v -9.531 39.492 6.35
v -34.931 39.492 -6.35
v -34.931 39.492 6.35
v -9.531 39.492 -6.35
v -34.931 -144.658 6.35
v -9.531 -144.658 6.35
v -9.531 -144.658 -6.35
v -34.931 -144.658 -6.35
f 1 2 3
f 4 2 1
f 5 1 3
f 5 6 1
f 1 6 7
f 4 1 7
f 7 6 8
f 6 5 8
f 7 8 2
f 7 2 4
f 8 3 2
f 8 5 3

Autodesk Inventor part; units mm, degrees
ref_plane "YZ Plane" through (0, 0, 0) normal (1, 0, 0) x (0, 1, 0)
ref_plane "XZ Plane" through (0, 0, 0) normal (0, 1, 0) x (-1, 0, 0)
ref_plane "XY Plane" through (0, 0, 0) normal (0, 0, 1) x (1, 0, 0)
sketch "Sketch1" plane through (0, 0, 0) normal (0, 0, 1) x (1, 0, 0)
  line L0 (-22.2313, 26.7915) -> (109.8487, 26.7915)
  line L1 (109.8487, 26.7915) -> (109.8487, -144.6585)
  line L2 (109.8487, -144.6585) -> (-22.2313, -144.6585)
  line L3 (-22.2313, -144.6585) -> (-22.2313, 26.7915)
  line L4 (-22.2313, 26.7915) -> (-28.5813, 26.7915)
  line L5 (-28.5813, 26.7915) -> (-28.5813, 39.4915)
  line L6 (-28.5813, 39.4915) -> (116.1987, 39.4915)
  line L7 (116.1987, 39.4915) -> (116.1987, 26.7915)
  line L8 (116.1987, 26.7915) -> (128.8987, 26.7915)
  line L9 (128.8987, 26.7915) -> (128.8987, 14.0915)
  line L10 (128.8987, 14.0915) -> (116.1987, 14.0915)
  line L11 (116.1987, 14.0915) -> (116.1987, -131.9585)
  line L12 (116.1987, -131.9585) -> (128.8987, -131.9585)
  line L13 (128.8987, -131.9585) -> (128.8987, -144.6585)
  line L14 (128.8987, -144.6585) -> (116.1987, -144.6585)
  line L15 (116.1987, -144.6585) -> (116.1987, -154.1835)
  line L16 (116.1987, -154.1835) -> (-28.5813, -154.1835)
  line L17 (-28.5813, -154.1835) -> (-28.5813, -144.6585)
  line L18 (-28.5813, -144.6585) -> (-41.2813, -144.6585)
  line L19 (-41.2813, -144.6585) -> (-41.2813, -131.9585)
  line L20 (-41.2813, -131.9585) -> (-28.5813, -131.9585)
  line L21 (-28.5813, -131.9585) -> (-28.5813, 14.0915)
  line L22 (-28.5813, 14.0915) -> (-41.2813, 14.0915)
  line L23 (-41.2813, 14.0915) -> (-41.2813, 26.7915)
  line L24 (-41.2813, 26.7915) -> (-28.5813, 26.7915)
  line L25 (-22.2313, -144.6585) -> (-22.2313, -151.0085)
  line L26 (-22.2313, -151.0085) -> (15.8687, -151.0085)
  line L27 (15.8687, -151.0085) -> (15.8687, -144.6585)
  line L28 (15.8687, -144.6585) -> (22.2187, -144.6585)
  line L29 (22.2187, -144.6585) -> (22.2187, -151.0085)
  line L30 (109.8487, -144.6585) -> (109.8487, -151.0085)
  line L31 (109.8487, -151.0085) -> (71.7487, -151.0085)
  line L32 (71.7487, -151.0085) -> (71.7487, -144.6585)
  line L33 (71.7487, -144.6585) -> (65.3987, -144.6585)
  line L34 (65.3987, -144.6585) -> (65.3987, -151.0085)
  line L35 (65.3987, -151.0085) -> (22.2187, -151.0085)
  line L36 (-22.2313, 26.7915) -> (-22.2313, 33.1415)
  line L37 (-22.2313, 33.1415) -> (15.8687, 33.1415)
  line L38 (15.8687, 33.1415) -> (15.8687, 26.7915)
  line L39 (22.2187, 26.7915) -> (22.2187, 33.1415)
  line L40 (22.2187, 33.1415) -> (65.3987, 33.1415)
  line L41 (65.3987, 33.1415) -> (65.3987, 26.7915)
  line L42 (71.7487, 26.7915) -> (71.7487, 33.1415)
  line L43 (71.7487, 33.1415) -> (109.8487, 33.1415)
  line L44 (109.8487, 33.1415) -> (109.8487, 26.7915)
  circle A0 centre (-34.9313, 20.4415) radius 1.9812
  circle A1 centre (122.5487, 20.4415) radius 1.9812
  circle A2 centre (122.5487, -138.3085) radius 1.9812
  circle A3 centre (-34.9313, -138.3085) radius 1.9812
  point P0 (0, 0)
  dimension "d0" = 132.08
  dimension "d1" = 171.45
  dimension "d2" = 6.35
  dimension "d3" = 12.7
  dimension "d4" = 144.78
  dimension "d5" = 12.7
  dimension "d6" = 12.7
  dimension "d7" = 146.05
  dimension "d8" = 9.525
  dimension "d9" = 12.7
  dimension "d10" = 6.35
  dimension "d11" = 38.1
  dimension "d12" = 6.35
  dimension "d13" = 38.1
  dimension "d14" = 6.35
  dimension "d15" = 3.9624
  dimension "d16" = 3.9624
extrude "Extrusion1" add sketch "Sketch1" along normal blind 6.35
sketch "Sketch2" plane through (-28.5813, -154.1835, 0) normal (0, -1, 0) x (1, 0, 0)
  line L0 (144.78, 6.35) -> (0, 6.35) projected
  line L1 (0, 0) -> (0, 6.35) projected
  line L2 (0, 0) -> (144.78, 0) projected
  line L3 (144.78, 0) -> (144.78, 6.35) projected
  point P0 (28.5813, 0)
extrude "Extrusion2" add sketch "Sketch2" along normal blind 3.175
sketch "Sketch3" plane through (0, 0, 6.35) normal (0, 0, 1) x (1, 0, 0)
  line L0 (-28.5813, 14.0915) -> (-41.2813, 14.0915) projected
  line L1 (-28.5813, -131.9585) -> (-28.5813, 14.0915) projected
  line L2 (-41.2813, -131.9585) -> (-28.5813, -131.9585) projected
  line L3 (116.1987, -131.9585) -> (128.8987, -131.9585) projected
  line L4 (116.1987, 14.0915) -> (116.1987, -131.9585) projected
  line L5 (128.8987, 14.0915) -> (116.1987, 14.0915) projected
  line L6 (71.7487, 33.1415) -> (109.8487, 33.1415) projected
  line L7 (-41.2813, 14.0915) -> (-41.2813, -131.9585)
  line L8 (128.8987, 14.0915) -> (128.8987, -131.9585)
  point P0 (0, 0)
extrude "Extrusion3" add sketch "Sketch3" against normal blind 6.35
sketch "Sketch4" plane through (0, 0, 6.35) normal (0, 0, 1) x (1, 0, 0)
  line L0 (-28.5813, -157.3585) -> (-28.5813, -144.6585) projected
  line L1 (-28.5813, -157.3585) -> (116.1987, -157.3585) projected
  line L2 (116.1987, -144.6585) -> (116.1987, -157.3585) projected
  line L3 (109.8487, 33.1415) -> (109.8487, -151.0085) projected
  line L4 (-22.2313, -151.0085) -> (-22.2313, 33.1415) projected
  line L5 (15.8687, 26.7915) -> (22.2187, 26.7915) projected
  line L6 (71.7487, 33.1415) -> (109.8487, 33.1415) projected
  line L7 (15.8687, 26.7915) -> (-22.2313, 26.7915)
  line L8 (22.2187, 26.7915) -> (109.8487, 26.7915)
  line L9 (109.8487, 26.7915) -> (109.8487, 20.4415)
  line L10 (109.8487, 20.4415) -> (-22.2313, 20.4415)
  line L11 (-22.2313, 20.4415) -> (-22.2313, 26.7915)
  line L12 (-22.2313, -144.6585) -> (-22.2313, -138.3085)
  line L13 (-22.2313, -138.3085) -> (109.8487, -138.3085)
  line L14 (109.8487, -144.6585) -> (-22.2313, -144.6585)
  line L15 (-28.5813, -151.0085) -> (-41.2813, -151.0085)
  line L16 (-41.2813, -151.0085) -> (-41.2813, -157.3585)
  line L17 (-41.2813, -157.3585) -> (-28.5813, -157.3585)
  line L18 (116.1987, -151.0085) -> (128.8987, -151.0085)
  line L19 (128.8987, -151.0085) -> (128.8987, -157.3585)
  line L20 (128.8987, -157.3585) -> (116.1987, -157.3585)
  point P0 (0, 0)
extrude "Extrusion4" add sketch "Sketch4" against normal blind 6.35 contours L17 L16 L15 L0 | L2 L18 L19 L20 | L3 L10 L4 L7 L5 L8 | L3 L14 L4 L13
sketch "Sketch5" plane through (0, 0, 6.35) normal (0, 0, 1) x (1, 0, 0)
  line L0 (-28.5813, 26.7915) -> (-28.5813, 39.4915) projected
  line L1 (116.1987, 39.4915) -> (116.1987, 26.7915) projected
  line L2 (15.8687, 33.1415) -> (15.8687, 26.7915) projected
  line L3 (-28.5813, 39.4915) -> (-41.2813, 39.4915)
  line L4 (-41.2813, 39.4915) -> (-41.2813, 33.1415)
  line L5 (-41.2813, 33.1415) -> (-28.5813, 33.1415)
  line L6 (116.1987, 39.4915) -> (128.8987, 39.4915)
  line L7 (128.8987, 39.4915) -> (128.8987, 33.1415)
  line L8 (128.8987, 33.1415) -> (116.1987, 33.1415)
  point P0 (0, 0)
extrude "Extrusion5" add sketch "Sketch5" against normal blind 6.35
sketch "Sketch6" plane through (0, 0, 6.35) normal (0, 0, 1) x (1, 0, 0)
  line L0 (65.3987, -151.0085) -> (22.2187, -151.0085) projected
  line L1 (22.2187, -144.6585) -> (65.3987, -144.6585) projected
  line L2 (-22.2313, -144.6585) -> (15.8687, -144.6585) projected
  line L3 (109.8487, -151.0085) -> (71.7487, -151.0085) projected
  line L4 (65.3987, 26.7915) -> (22.2187, 26.7915) projected
  line L5 (109.8487, 26.7915) -> (71.7487, 26.7915) projected
  line L6 (-41.2813, 26.7915) -> (-28.5813, 26.7915) projected
  line L7 (-28.5813, -151.0085) -> (-41.2813, -151.0085) projected
  line L8 (128.8987, -151.0085) -> (116.1987, -151.0085) projected
  line L9 (116.1987, 26.7915) -> (128.8987, 26.7915) projected
  line L10 (-28.5813, 33.1415) -> (-34.9313, 33.1415)
  line L11 (-34.9313, 33.1415) -> (-34.9313, 26.7915)
  line L12 (-34.9313, 26.7915) -> (-28.5813, 26.7915)
  line L13 (-28.5813, 26.7915) -> (-28.5813, 33.1415)
  line L14 (15.8687, 33.1415) -> (10.0792, 33.1415)
  line L15 (10.0792, 33.1415) -> (10.0792, 26.7915)
  line L16 (10.0792, 26.7915) -> (15.8687, 26.7915)
  line L17 (15.8687, 26.7915) -> (15.8687, 33.1415)
  line L18 (22.2187, 33.1415) -> (28.5687, 33.1415)
  line L19 (28.5687, 33.1415) -> (28.5687, 26.7915)
  line L20 (28.5687, 26.7915) -> (22.2187, 26.7915)
  line L21 (22.2187, 26.7915) -> (22.2187, 33.1415)
  line L22 (65.3987, 33.1415) -> (59.0487, 33.1415)
  line L23 (59.0487, 33.1415) -> (59.0487, 26.7915)
  line L24 (59.0487, 26.7915) -> (65.3987, 26.7915)
  line L25 (65.3987, 26.7915) -> (65.3987, 33.1415)
  line L26 (71.7487, 33.1415) -> (78.0987, 33.1415)
  line L27 (78.0987, 33.1415) -> (78.0987, 26.7915)
  line L28 (78.0987, 26.7915) -> (71.7487, 26.7915)
  line L29 (71.7487, 26.7915) -> (71.7487, 33.1415)
  line L30 (116.1987, 33.1415) -> (122.5487, 33.1415)
  line L31 (122.5487, 33.1415) -> (122.5487, 26.7915)
  line L32 (122.5487, 26.7915) -> (116.1987, 26.7915)
  line L33 (116.1987, 26.7915) -> (116.1987, 33.1415)
  line L34 (-28.5813, -144.6585) -> (-34.9313, -144.6585)
  line L35 (-34.9313, -144.6585) -> (-34.9313, -151.0085)
  line L36 (-34.9313, -151.0085) -> (-28.5813, -151.0085)
  line L37 (-28.5813, -151.0085) -> (-28.5813, -144.6585)
  line L38 (10.0792, -144.6585) -> (28.5687, -144.6585)
  line L39 (28.5687, -144.6585) -> (28.5687, -151.0085)
  line L40 (28.5687, -151.0085) -> (10.0792, -151.0085)
  line L41 (10.0792, -151.0085) -> (10.0792, -144.6585)
  line L42 (59.0487, -144.6585) -> (78.0987, -144.6585)
  line L43 (78.0987, -144.6585) -> (78.0987, -151.0085)
  line L44 (78.0987, -151.0085) -> (59.0487, -151.0085)
  line L45 (59.0487, -151.0085) -> (59.0487, -144.6585)
  line L46 (116.1987, -144.6585) -> (122.5487, -144.6585)
  line L47 (122.5487, -144.6585) -> (122.5487, -151.0085)
  line L48 (122.5487, -151.0085) -> (116.1987, -151.0085)
  line L49 (116.1987, -151.0085) -> (116.1987, -144.6585)
  point P0 (0, 0)
  dimension "d27" = 6.35
  dimension "d28" = 6.35
  dimension "d29" = 6.35
  dimension "d30" = 6.35
  dimension "d31" = 6.35
extrude "Extrusion6" add sketch "Sketch6" against normal blind 6.35 contours L0 L45 L1 L42 L43 L3 L44 | L0 L40 L41 L2 L38 L1 L39 | L4 L21 L18 L19 | L4 L23 L22 L25 | L5 L29 L26 L27 | L11 L10 L13 L6 | L7 L35 L34 L37 | L8 L49 L46 L47 | L33 L30 L31 L9 | L17 L16 L15 L14
sketch "Sketch7" plane through (0, 0, 0) normal (0, 0, -1) x (-1, 0, 0)
  line L0 (-128.8987, 39.4915) -> (-90.7987, 39.4915)
  line L1 (-90.7987, 39.4915) -> (-90.7987, 115.6915)
  line L2 (-90.7987, 115.6915) -> (-128.8987, 115.6915)
  line L3 (-128.8987, 115.6915) -> (-128.8987, 39.4915)
  line L4 (-90.7987, 39.4915) -> (41.2813, 39.4915)
  line L5 (41.2813, 39.4915) -> (41.2813, 64.8915)
  line L6 (41.2813, 64.8915) -> (-90.7987, 64.8915)
  line L7 (-90.7987, 64.8915) -> (-90.7987, 39.4915)
  point P0 (0, 0)
  dimension "d34" = 38.1
  dimension "d35" = 76.2
  dimension "d36" = 25.4
extrude "Extrusion7" add sketch "Sketch7" against normal blind 6.35
sketch "Sketch8" plane through (0, 0, 0) normal (0, 0, -1) x (-1, 0, 0)
  line L0 (41.2813, 64.8915) -> (210.1913, 64.8915)
  line L1 (210.1913, 64.8915) -> (210.1913, 39.4915)
  line L2 (210.1913, 39.4915) -> (41.2813, 39.4915)
  line L3 (41.2813, 39.4915) -> (41.2813, 64.8915)
  line L4 (210.1913, 64.8915) -> (172.0913, 64.8915)
  line L5 (172.0913, 64.8915) -> (172.0913, 115.6915)
  line L6 (172.0913, 115.6915) -> (210.1913, 115.6915)
  line L7 (210.1913, 115.6915) -> (210.1913, 64.8915)
  point P0 (0, 0)
  dimension "d39" = 168.91
  dimension "d40" = 25.4
  dimension "d41" = 38.1
extrude "Extrusion8" add sketch "Sketch8" against normal blind 6.35
sketch "Sketch9" plane through (0, 0, 0) normal (0, 0, -1) x (-1, 0, 0)
  line L0 (-109.8487, 26.7915) -> (-109.8487, 33.1415) projected
  line L1 (-109.8487, 33.1415) -> (-78.0987, 33.1415) projected
  line L2 (-78.0987, 26.7915) -> (-78.0987, 33.1415) projected
  line L3 (-109.8487, 26.7915) -> (-78.0987, 26.7915) projected
  line L4 (-10.0792, 33.1415) -> (-10.0792, 26.7915) projected
  line L5 (-10.0792, 33.1415) -> (22.2313, 33.1415) projected
  line L6 (22.2313, 33.1415) -> (22.2313, 26.7915) projected
  line L7 (-10.0792, 26.7915) -> (22.2313, 26.7915) projected
  line L8 (-59.0487, 33.1415) -> (-28.5687, 33.1415) projected
  line L9 (-28.5687, 26.7915) -> (-28.5687, 33.1415) projected
  line L10 (-59.0487, 26.7915) -> (-28.5687, 26.7915) projected
  line L11 (-59.0487, 33.1415) -> (-59.0487, 26.7915) projected
  line L12 (-128.8987, 115.6915) -> (-128.8987, 33.1415) projected
  line L13 (-128.8987, 49.764) -> (41.2813, 49.764)
  line L14 (41.2813, 49.764) -> (41.2813, 26.7915)
  line L15 (41.2813, 26.7915) -> (-128.8987, 26.7915)
  line L16 (-128.8987, 26.7915) -> (-128.8987, 49.764)
  point P0 (0, 0)
extrude "Extrusion9" add sketch "Sketch9" against normal blind 6.35
sketch "Sketch10" plane through (0, 0, 0) normal (0, 0, -1) x (-1, 0, 0)
  line L0 (41.2813, 39.4915) -> (210.1913, 39.4915)
  line L1 (210.1913, 39.4915) -> (210.1913, 20.4415)
  line L2 (210.1913, 20.4415) -> (41.2813, 20.4415)
  line L3 (41.2813, 20.4415) -> (41.2813, 39.4915)
  point P0 (0, 0)
extrude "Extrusion10" add sketch "Sketch10" against normal blind 6.35
sketch "Sketch11" plane through (0, 0, 0) normal (0, 0, -1) x (-1, 0, 0)
  line L0 (-128.8987, 115.6915) -> (-90.7987, 115.6915)
  line L1 (-90.7987, 115.6915) -> (-90.7987, 141.0915)
  line L2 (-90.7987, 141.0915) -> (-128.8987, 141.0915)
  line L3 (-128.8987, 141.0915) -> (-128.8987, 115.6915)
  line L4 (172.0913, 115.6915) -> (210.1913, 115.6915)
  line L5 (210.1913, 115.6915) -> (210.1913, 141.0915)
  line L6 (210.1913, 141.0915) -> (172.0913, 141.0915)
  line L7 (172.0913, 141.0915) -> (172.0913, 115.6915)
  point P0 (0, 0)
  dimension "d48" = 25.4
extrude "Extrusion11" add sketch "Sketch11" against normal blind 6.35
sketch "Sketch12" plane through (0, 0, 0) normal (0, 0, -1) x (-1, 0, 0)
  line L0 (210.1913, 20.4415) -> (172.0913, 20.4415)
  line L1 (172.0913, 20.4415) -> (172.0913, 26.7915)
  line L2 (172.0913, 26.7915) -> (210.1913, 26.7915)
  line L3 (210.1913, 26.7915) -> (210.1913, 20.4415)
  line L4 (172.0913, 26.7915) -> (146.6913, 26.7915)
  line L5 (146.6913, 26.7915) -> (146.6913, 33.1415)
  line L6 (146.6913, 33.1415) -> (172.0913, 33.1415)
  line L7 (172.0913, 33.1415) -> (172.0913, 26.7915)
  line L8 (146.6913, 33.1415) -> (172.0913, 33.1415)
  line L9 (172.0913, 33.1415) -> (172.0913, 39.4915)
  line L10 (172.0913, 39.4915) -> (146.6913, 39.4915)
  line L11 (146.6913, 39.4915) -> (146.6913, 33.1415)
  line L12 (146.6913, 39.4915) -> (95.8913, 39.4915)
  line L13 (95.8913, 39.4915) -> (95.8913, 33.1415)
  line L14 (95.8913, 33.1415) -> (146.6913, 33.1415)
  line L15 (146.6913, 33.1415) -> (146.6913, 39.4915)
  line L16 (95.8913, 39.4915) -> (70.4913, 39.4915)
  line L17 (70.4913, 39.4915) -> (70.4913, 33.1415)
  line L18 (70.4913, 33.1415) -> (95.8913, 33.1415)
  line L19 (95.8913, 33.1415) -> (95.8913, 39.4915)
  line L20 (146.6913, 33.1415) -> (133.9913, 33.1415)
  line L21 (133.9913, 33.1415) -> (133.9913, 26.7915)
  line L22 (133.9913, 26.7915) -> (146.6913, 26.7915)
  line L23 (146.6913, 26.7915) -> (146.6913, 33.1415)
  line L24 (133.9913, 33.1415) -> (108.5913, 33.1415)
  line L25 (108.5913, 33.1415) -> (108.5913, 26.7915)
  line L26 (108.5913, 26.7915) -> (133.9913, 26.7915)
  line L27 (133.9913, 26.7915) -> (133.9913, 33.1415)
  line L28 (70.4913, 33.1415) -> (57.7913, 33.1415)
  line L29 (57.7913, 33.1415) -> (57.7913, 26.7915)
  line L30 (57.7913, 26.7915) -> (70.4913, 26.7915)
  line L31 (70.4913, 26.7915) -> (70.4913, 33.1415)
  line L32 (57.7913, 26.7915) -> (32.3913, 26.7915)
  line L33 (32.3913, 26.7915) -> (32.3913, 33.1415)
  line L34 (32.3913, 33.1415) -> (57.7913, 33.1415)
  line L35 (57.7913, 33.1415) -> (57.7913, 26.7915)
  line L36 (32.3913, 33.1415) -> (19.6913, 33.1415)
  line L37 (19.6913, 33.1415) -> (19.6913, 26.7915)
  line L38 (19.6913, 26.7915) -> (32.3913, 26.7915)
  line L39 (32.3913, 26.7915) -> (32.3913, 33.1415)
  line L40 (19.6913, 33.1415) -> (-5.7087, 33.1415)
  line L41 (-5.7087, 33.1415) -> (-5.7087, 39.4915)
  line L42 (-5.7087, 39.4915) -> (19.6913, 39.4915)
  line L43 (19.6913, 39.4915) -> (19.6913, 33.1415)
  line L44 (-5.7087, 33.1415) -> (-18.4087, 33.1415)
  line L45 (-18.4087, 33.1415) -> (-18.4087, 26.7915)
  line L46 (-18.4087, 26.7915) -> (-5.7087, 26.7915)
  line L47 (-5.7087, 26.7915) -> (-5.7087, 33.1415)
  line L48 (-18.4087, 33.1415) -> (-43.8087, 33.1415)
  line L49 (-43.8087, 33.1415) -> (-43.8087, 26.7915)
  line L50 (-43.8087, 26.7915) -> (-18.4087, 26.7915)
  line L51 (-18.4087, 26.7915) -> (-18.4087, 33.1415)
  line L52 (-43.8087, 33.1415) -> (-56.5087, 33.1415)
  line L53 (-56.5087, 33.1415) -> (-56.5087, 26.7915)
  line L54 (-56.5087, 26.7915) -> (-43.8087, 26.7915)
  line L55 (-43.8087, 26.7915) -> (-43.8087, 33.1415)
  line L56 (-56.5087, 33.1415) -> (-81.9087, 33.1415)
  line L57 (-81.9087, 33.1415) -> (-81.9087, 38.8107)
  line L58 (-81.9087, 38.8107) -> (-56.5087, 38.8107)
  line L59 (-56.5087, 38.8107) -> (-56.5087, 33.1415)
  line L60 (-81.9087, 33.1415) -> (-94.6087, 33.1415)
  line L61 (-94.6087, 33.1415) -> (-94.6087, 26.7915)
  line L62 (-94.6087, 26.7915) -> (-81.9087, 26.7915)
  line L63 (-81.9087, 26.7915) -> (-81.9087, 33.1415)
  line L64 (-94.6087, 26.7915) -> (-120.0087, 26.7915)
  line L65 (-120.0087, 26.7915) -> (-120.0087, 33.1415)
  line L66 (-120.0087, 33.1415) -> (-94.6087, 33.1415)
  line L67 (-94.6087, 33.1415) -> (-94.6087, 26.7915)
  point P0 (0, 0)
  dimension "d51" = 6.35
  dimension "d52" = 25.4
  dimension "d53" = 6.35
  dimension "d54" = 25.4
  dimension "d55" = 6.35
  dimension "d56" = 50.8
  dimension "d57" = 25.4
  dimension "d58" = 12.7
  dimension "d59" = 25.4
  dimension "d60" = 12.7
  dimension "d61" = 25.4
  dimension "d62" = 12.7
  dimension "d63" = 25.4
  dimension "d64" = 12.7
  dimension "d65" = 25.4
  dimension "d66" = 12.7
  dimension "d67" = 25.4
  dimension "d68" = 12.7
  dimension "d69" = 25.4
extrude "Extrusion12" cut sketch "Sketch12" against normal blind 6.35 contours L56 L57 L58 L59 | L40 L41 L42 L43 | L6 L11 L10 L9 | L26 L25 L14 L21 | L13 L18 L17 L16 | L29 L32 L33 L34 | L45 L50 L49 L48 | L61 L64 L65 L66
sketch "Sketch13" plane through (0, 0, 0) normal (0, 0, -1) x (-1, 0, 0)
  line L0 (210.1913, 20.4415) -> (210.1913, 141.0915) projected
  line L1 (210.1913, 20.4415) -> (203.8413, 20.4415)
  line L2 (203.8413, 20.4415) -> (203.8413, 64.8915)
  line L3 (203.8413, 64.8915) -> (210.1913, 64.8915)
  line L4 (210.1913, 64.8915) -> (210.1913, 20.4415)
  line L5 (203.8413, 64.8915) -> (210.1913, 64.8915)
  line L6 (210.1913, 64.8915) -> (210.1913, 90.2915)
  line L7 (210.1913, 90.2915) -> (203.8413, 90.2915)
  line L8 (203.8413, 90.2915) -> (203.8413, 64.8915)
  line L9 (203.8413, 90.2915) -> (210.1913, 90.2915)
  line L10 (210.1913, 90.2915) -> (210.1913, 115.6915)
  line L11 (210.1913, 115.6915) -> (203.8413, 115.6915)
  line L12 (203.8413, 115.6915) -> (203.8413, 90.2915)
  point P0 (0, 0)
  dimension "d72" = 6.35
  dimension "d73" = 25.4
  dimension "d74" = 25.4
extrude "Extrusion13" cut sketch "Sketch13" against normal blind 6.35 contours L1 L2 L3 L0 | L7 L12 L11 L0
sketch "Sketch14" plane through (0, 0, 0) normal (0, 0, -1) x (-1, 0, 0)
  line L0 (-90.7987, 64.8915) -> (-90.7987, 141.0915) projected
  line L1 (-128.8987, -144.6585) -> (-128.8987, 141.0915) projected
  line L2 (-128.8987, 141.0915) -> (-90.7987, 141.0915)
  line L3 (-90.7987, 141.0915) -> (-90.7987, 115.6915)
  line L4 (-90.7987, 115.6915) -> (-128.8987, 115.6915)
  line L5 (-128.8987, 115.6915) -> (-128.8987, 141.0915)
  line L6 (172.0913, 141.0915) -> (210.1913, 141.0915)
  line L7 (210.1913, 141.0915) -> (210.1913, 115.6915)
  line L8 (210.1913, 115.6915) -> (172.0913, 115.6915)
  line L9 (172.0913, 115.6915) -> (172.0913, 141.0915)
  line L10 (-128.8987, 90.2915) -> (-122.5487, 90.2915)
  line L11 (-122.5487, 90.2915) -> (-122.5487, 64.8915)
  line L12 (-122.5487, 64.8915) -> (-128.8987, 64.8915)
  line L13 (-128.8987, 64.8915) -> (-128.8987, 90.2915)
  point P0 (0, 0)
extrude "Extrusion14" cut sketch "Sketch14" against normal blind 6.35
sketch "Sketch15" plane through (0, 0, 0) normal (0, 0, -1) x (-1, 0, 0)
  line L0 (203.8413, 20.4415) -> (203.8413, 64.8915) projected
  line L1 (203.8413, 39.4915) -> (197.4913, 39.4915)
  line L2 (197.4913, 39.4915) -> (197.4913, 26.7915)
  line L3 (197.4913, 26.7915) -> (203.8413, 26.7915)
  line L4 (203.8413, 26.7915) -> (203.8413, 39.4915)
  point P0 (0, 0)
  dimension "d79" = 6.35
extrude "Extrusion15" cut sketch "Sketch15" against normal blind 6.35
sketch "Sketch16" plane through (0, 0, 0) normal (0, 0, -1) x (-1, 0, 0)
  line L0 (-128.8987, 90.2915) -> (-109.8487, 90.2915)
  line L1 (-109.8487, 90.2915) -> (-109.8487, 77.5915)
  line L2 (-109.8487, 77.5915) -> (-128.8987, 77.5915)
  line L3 (-128.8987, 77.5915) -> (-128.8987, 90.2915)
  line L4 (172.0913, 115.6915) -> (191.1413, 115.6915)
  line L5 (191.1413, 115.6915) -> (191.1413, 83.9415)
  line L6 (191.1413, 83.9415) -> (172.0913, 83.9415)
  line L7 (172.0913, 83.9415) -> (172.0913, 115.6915)
  circle A0 centre (-109.8487, 77.5915) radius 1.9812
  circle A1 centre (191.1413, 83.9415) radius 1.9812
  point P0 (0, 0)
  dimension "d82" = 19.05
  dimension "d83" = 3.9624
  dimension "d84" = 3.9624
extrude "Extrusion16" cut sketch "Sketch16" against normal blind 6.35 contours A0 L2 L1 | L1 L2 A0 | A1 L6 L5 | L5 L6 A1
sketch "Sketch17" plane through (0, 0, 0) normal (0, 0, -1) x (-1, 0, 0)
  line L0 (-122.5487, 90.2915) -> (-128.8987, 90.2915)
  line L1 (-128.8987, 90.2915) -> (-128.8987, 64.8915)
  line L2 (-128.8987, 64.8915) -> (-122.5487, 64.8915)
  line L3 (-122.5487, 64.8915) -> (-122.5487, 90.2915)
  point P0 (0, 0)
extrude "Extrusion17" add sketch "Sketch17" against normal blind 6.35
sketch "Sketch18" plane through (0, 0, 0) normal (0, 0, -1) x (-1, 0, 0)
  line L0 (-128.8987, -144.6585) -> (-128.8987, 115.6915) projected
  line L1 (-128.8987, 115.6915) -> (-122.5487, 115.6915)
  line L2 (-122.5487, 115.6915) -> (-122.5487, 90.2915)
  line L3 (-122.5487, 90.2915) -> (-128.8987, 90.2915)
  line L4 (-128.8987, 90.2915) -> (-128.8987, 115.6915)
  line L5 (-128.8987, 90.2915) -> (-122.5487, 90.2915)
  line L6 (-122.5487, 90.2915) -> (-122.5487, 64.8915)
  line L7 (-122.5487, 64.8915) -> (-128.8987, 64.8915)
  line L8 (-128.8987, 64.8915) -> (-128.8987, 90.2915)
  line L9 (-122.5487, 64.8915) -> (-128.8987, 64.8915)
  line L10 (-128.8987, 64.8915) -> (-128.8987, 39.4915)
  line L11 (-128.8987, 39.4915) -> (-122.5487, 39.4915)
  line L12 (-122.5487, 39.4915) -> (-122.5487, 64.8915)
  point P0 (0, 0)
  dimension "d89" = 25.4
  dimension "d90" = 25.4
  dimension "d91" = 25.4
extrude "Extrusion18" cut sketch "Sketch18" against normal blind 6.35 contours L0 L7 L12 L11 | L0 L1 L2 L3
sketch "Sketch19" plane through (0, 0, 0) normal (0, 0, -1) x (-1, 0, 0)
  line L0 (-122.5487, 90.2915) -> (-128.8987, 90.2915) projected
  line L1 (-128.8987, 64.8915) -> (-128.8987, 90.2915) projected
  line L2 (-128.8987, 64.8915) -> (-122.5487, 64.8915) projected
  line L3 (-122.5487, 64.8915) -> (-122.5487, 39.4915) projected
  line L4 (197.4913, 39.4915) -> (203.8413, 39.4915) projected
  line L5 (203.8413, 39.4915) -> (203.8413, 64.8915) projected
  line L6 (203.8413, 64.8915) -> (210.1913, 64.8915) projected
  line L7 (210.1913, 64.8915) -> (210.1913, 90.2915) projected
  line L8 (210.1913, 90.2915) -> (203.8413, 90.2915) projected
  line L9 (203.8413, 90.2915) -> (203.8413, 115.6915) projected
  line L10 (203.8413, 115.6915) -> (172.0913, 115.6915) projected
  line L11 (172.0913, 115.6915) -> (172.0913, 64.8915) projected
  line L12 (172.0913, 64.8915) -> (-90.7987, 64.8915) projected
  line L13 (-90.7987, 64.8915) -> (-90.7987, 115.6915) projected
  line L14 (-90.7987, 115.6915) -> (-122.5487, 115.6915) projected
  line L15 (-122.5487, 115.6915) -> (-122.5487, 90.2915) projected
  circle A0 centre (191.1413, 83.9415) radius 1.9812 projected
  circle A1 centre (-109.8487, 77.5915) radius 1.9812 projected
  line L16 (-81.9087, 38.8107) -> (-56.5087, 38.8107) projected
  line L17 (22.2313, 20.4415) -> (22.2313, -138.3085) projected
  line L18 (-122.5487, 39.4915) -> (197.4913, 39.4915)
  line L19 (-81.9087, 38.8107) -> (-81.9087, 39.4915)
  line L20 (-56.5087, 38.8107) -> (-56.5087, 39.4915)
  point P0 (0, 0)
extrude "Extrusion19" cut sketch "Sketch19" against normal blind 25.4
sketch "Sketch20" plane through (0, 0, 0) normal (0, 0, -1) x (-1, 0, 0)
  line L0 (32.3913, 33.1415) -> (57.7913, 33.1415) projected
  line L1 (57.7913, 33.1415) -> (57.7913, 26.7915) projected
  line L2 (57.7913, 26.7915) -> (32.3913, 26.7915) projected
  line L3 (32.3913, 26.7915) -> (32.3913, 33.1415) projected
  line L4 (-43.8087, 26.7915) -> (-43.8087, 33.1415) projected
  line L5 (-43.8087, 33.1415) -> (-18.4087, 33.1415) projected
  line L6 (-18.4087, 33.1415) -> (-18.4087, 26.7915) projected
  line L7 (-18.4087, 26.7915) -> (-43.8087, 26.7915) projected
  line L8 (108.5913, 26.7915) -> (108.5913, 33.1415) projected
  line L9 (108.5913, 33.1415) -> (133.9913, 33.1415) projected
  line L10 (133.9913, 33.1415) -> (133.9913, 26.7915) projected
  line L11 (133.9913, 26.7915) -> (108.5913, 26.7915) projected
  line L12 (-120.0087, 33.1415) -> (-94.6087, 33.1415) projected
  line L13 (-94.6087, 33.1415) -> (-94.6087, 26.7915) projected
  line L14 (-94.6087, 26.7915) -> (-120.0087, 26.7915) projected
  line L15 (-120.0087, 26.7915) -> (-120.0087, 33.1415) projected
  line L16 (-128.8987, 39.4915) -> (203.8413, 39.4915)
  line L17 (203.8413, 39.4915) -> (203.8413, 26.7915)
  line L18 (203.8413, 26.7915) -> (-128.8987, 26.7915)
  line L19 (-128.8987, 26.7915) -> (-128.8987, 39.4915)
  line L20 (203.8413, 26.7915) -> (41.2813, 26.7915)
  line L21 (41.2813, 26.7915) -> (41.2813, 20.4415)
  line L22 (41.2813, 20.4415) -> (203.8413, 20.4415)
  line L23 (203.8413, 20.4415) -> (203.8413, 26.7915)
  point P0 (0, 0)
extrude "Extrusion20" cut sketch "Sketch20" against normal blind 25.4 contours L3 L18 L6 L5 L4 L13 L12 L15 L19 L16 L17 L10 L9 L8 L1 L0 | L0 L1 L2 L3 | L18 L11 L23 L22 L21 L2 | L7 L4 L5 L6 | L14 L15 L12 L13
sketch "Sketch21" plane through (0, 0, 6.35) normal (0, 0, 1) x (1, 0, 0)
  line L0 (128.8987, -157.3585) -> (128.8987, -151.0085) projected
  line L1 (128.8987, -151.0085) -> (122.5487, -151.0085) projected
  line L2 (122.5487, -151.0085) -> (122.5487, -144.6585) projected
  line L3 (128.8987, -144.6585) -> (122.5487, -144.6585) projected
  line L4 (128.8987, 26.7915) -> (128.8987, -144.6585) projected
  line L5 (128.8987, 26.7915) -> (-41.2813, 26.7915) projected
  line L6 (-22.2313, -138.3085) -> (-22.2313, 20.4415) projected
  line L7 (-22.2313, 20.4415) -> (109.8487, 20.4415) projected
  line L8 (109.8487, 20.4415) -> (109.8487, -138.3085) projected
  line L9 (109.8487, -138.3085) -> (-22.2313, -138.3085) projected
  line L10 (78.0987, -144.6585) -> (109.8487, -144.6585) projected
  line L11 (109.8487, -144.6585) -> (109.8487, -151.0085) projected
  line L12 (109.8487, -151.0085) -> (78.0987, -151.0085) projected
  line L13 (78.0987, -151.0085) -> (78.0987, -144.6585) projected
  circle A0 centre (122.5487, -138.3085) radius 1.9812 projected
  circle A1 centre (122.5487, 20.4415) radius 1.9812 projected
  line L14 (10.0792, -151.0085) -> (-22.2313, -151.0085) projected
  line L15 (-22.2313, -151.0085) -> (-22.2313, -144.6585) projected
  line L16 (-22.2313, -144.6585) -> (10.0792, -144.6585) projected
  line L17 (10.0792, -144.6585) -> (10.0792, -151.0085) projected
  line L18 (28.5687, -144.6585) -> (59.0487, -144.6585) projected
  line L19 (59.0487, -144.6585) -> (59.0487, -151.0085) projected
  line L20 (59.0487, -151.0085) -> (28.5687, -151.0085) projected
  line L21 (28.5687, -151.0085) -> (28.5687, -144.6585) projected
  line L22 (-22.2313, 26.7915) -> (128.8987, 26.7915)
  line L23 (128.8987, 26.7915) -> (128.8987, -157.3585)
  line L24 (128.8987, -157.3585) -> (-22.2313, -157.3585)
  line L25 (-22.2313, -157.3585) -> (-22.2313, 26.7915)
  line L26 (128.8987, -157.3585) -> (-41.2813, -157.3585)
  line L27 (-41.2813, -157.3585) -> (-41.2813, -144.6585)
  line L28 (-41.2813, -144.6585) -> (128.8987, -144.6585)
  line L29 (128.8987, -144.6585) -> (128.8987, -157.3585)
  point P0 (0, 0)
extrude "Extrusion21" cut sketch "Sketch21" against normal blind 25.4 contours L24 L25 L14 L17 L28 L21 L20 L19 L13 L12 L11 L2 L1 L0 | L1 L2 L3 L23 | L26 L27 L28 L15 L25 | L3 L28 L10 L18 L16 L25 L9 L8 L7 L5 L4 | L15 L16 L17 L14 | L11 L12 L13 L10 | L18 L19 L20 L21
sketch "Sketch22" plane through (0, 0, 6.35) normal (0, 0, 1) x (1, 0, 0)
  line L0 (-22.2313, -144.6585) -> (-22.2313, 26.7915) projected
  line L1 (-22.2313, 26.7915) -> (-41.2813, 26.7915) projected
  line L2 (-41.2813, 26.7915) -> (-41.2813, -144.6585) projected
  line L3 (-22.2313, -144.6585) -> (-41.2813, -144.6585) projected
  circle A0 centre (-34.9313, -138.3085) radius 1.9812 projected
  circle A1 centre (-34.9313, 20.4415) radius 1.9812 projected
  point P0 (0, 0)
extrude "Extrusion22" add sketch "Sketch22" against normal blind 12.7
sketch "Sketch23" plane through (0, 0, 6.35) normal (0, 0, 1) x (1, 0, 0)
  circle A0 centre (-34.9313, -138.3085) radius 1.9812 projected
  circle A1 centre (-34.9313, 20.4415) radius 1.9812 projected
  point P0 (0, 0)
extrude "Extrusion23" add sketch "Sketch23" against normal blind 12.7
sketch "Sketch24" plane through (0, 0, 6.35) normal (0, 0, 1) x (1, 0, 0)
  line L0 (-22.2313, -144.6585) -> (-41.2813, -144.6585) projected
  line L1 (-41.2813, 26.7915) -> (-34.9313, 26.7915)
  line L2 (-34.9313, 26.7915) -> (-34.9313, -144.6585)
  line L3 (-34.9313, -144.6585) -> (-41.2813, -144.6585)
  line L4 (-41.2813, -144.6585) -> (-41.2813, 26.7915)
  point P0 (0, 0)
  dimension "d104" = 6.35
extrude "Extrusion24" cut sketch "Sketch24" against normal blind 12.7
sketch "Sketch25" plane through (-22.2313, 26.7915, 6.35) normal (0, 1, 0) x (1, 0, 0)
  line L0 (-12.7, 12.7) -> (-12.7, 0) projected
  line L1 (0, 0) -> (-12.7, 0) projected
  line L2 (0, 0) -> (0, 12.7) projected
  line L3 (0, 12.7) -> (-12.7, 12.7) projected
  point P0 (22.2313, 6.35)
extrude "Extrusion25" add sketch "Sketch25" along normal blind 12.7
sketch "Sketch26" plane through (-22.2313, -144.6585, -6.35) normal (0, -1, 0) x (1, 0, 0)
  line L0 (-12.7, 12.7) -> (-12.7, 0) projected
  line L1 (-12.7, 0) -> (0, 0) projected
  line L2 (0, 12.7) -> (0, 0) projected
  line L3 (0, 12.7) -> (-12.7, 12.7) projected
  point P0 (22.2313, 6.35)
extrude "Extrusion26" add sketch "Sketch26" along normal blind 6.35
sketch "Sketch27" plane through (-22.2313, 39.4915, 6.35) normal (1, 0, 0) x (0, 0, -1)
  line L0 (0, -190.5) -> (0, 0) projected
  line L1 (0, -190.5) -> (12.7, -190.5) projected
  line L2 (12.7, -190.5) -> (12.7, 0) projected
  line L3 (12.7, 0) -> (0, 0) projected
  point P0 (6.35, -39.4915)
extrude "Extrusion27" add sketch "Sketch27" along normal blind 6.35
sketch "Sketch28" plane through (0, 0, -6.35) normal (0, 0, -1) x (-1, 0, 0)
  line L0 (34.9313, -151.0085) -> (34.9313, 39.4915) projected
  line L1 (15.8813, 39.4915) -> (15.8813, -151.0085) projected
  line L2 (15.8813, -151.0085) -> (34.9313, -151.0085) projected
  line L3 (15.8813, -151.0085) -> (15.8813, -144.6585)
  line L4 (15.8813, -144.6585) -> (34.9313, -144.6585)
  point P0 (0, 0)
  dimension "d113" = 6.35
extrude "Extrusion28" cut sketch "Sketch28" against normal blind 12.7
sketch "Sketch29" plane through (-15.8813, 39.4915, 6.35) normal (1, 0, 0) x (0, 0, -1)
  line L0 (0, -184.15) -> (12.7, -184.15) projected
  line L1 (12.7, 0) -> (12.7, -184.15) projected
  line L2 (0, 0) -> (12.7, 0) projected
  line L3 (0, -184.15) -> (0, 0) projected
  point P0 (6.35, -39.4915)
extrude "Extrusion29" add sketch "Sketch29" along normal blind 6.35
sketch "Sketch30" plane through (-22.2313, 39.4915, 6.35) normal (0, 1, 0) x (1, 0, 0)
  line L0 (-12.7, 12.7) -> (12.7, 12.7) projected
  line L1 (-12.7, 0) -> (-12.7, 12.7) projected
  line L2 (12.7, 0) -> (-12.7, 0) projected
  line L3 (12.7, 0) -> (12.7, 12.7) projected
  point P0 (22.2313, 6.35)
extrude "Extrusion30" add sketch "Sketch30" along normal blind 12.7
sketch "Sketch31" plane through (-22.2313, 52.1915, 6.35) normal (0, 1, 0) x (1, 0, 0)
  line L0 (12.7, 12.7) -> (12.7, 0) projected
  line L1 (-12.7, 12.7) -> (12.7, 12.7) projected
  line L2 (-12.7, 0) -> (-12.7, 12.7) projected
  line L3 (12.7, 0) -> (-12.7, 0) projected
  point P0 (22.2313, 6.35)
extrude "Extrusion31" cut sketch "Sketch31" against normal blind 12.7
properties part number "top-bot connector lame"
